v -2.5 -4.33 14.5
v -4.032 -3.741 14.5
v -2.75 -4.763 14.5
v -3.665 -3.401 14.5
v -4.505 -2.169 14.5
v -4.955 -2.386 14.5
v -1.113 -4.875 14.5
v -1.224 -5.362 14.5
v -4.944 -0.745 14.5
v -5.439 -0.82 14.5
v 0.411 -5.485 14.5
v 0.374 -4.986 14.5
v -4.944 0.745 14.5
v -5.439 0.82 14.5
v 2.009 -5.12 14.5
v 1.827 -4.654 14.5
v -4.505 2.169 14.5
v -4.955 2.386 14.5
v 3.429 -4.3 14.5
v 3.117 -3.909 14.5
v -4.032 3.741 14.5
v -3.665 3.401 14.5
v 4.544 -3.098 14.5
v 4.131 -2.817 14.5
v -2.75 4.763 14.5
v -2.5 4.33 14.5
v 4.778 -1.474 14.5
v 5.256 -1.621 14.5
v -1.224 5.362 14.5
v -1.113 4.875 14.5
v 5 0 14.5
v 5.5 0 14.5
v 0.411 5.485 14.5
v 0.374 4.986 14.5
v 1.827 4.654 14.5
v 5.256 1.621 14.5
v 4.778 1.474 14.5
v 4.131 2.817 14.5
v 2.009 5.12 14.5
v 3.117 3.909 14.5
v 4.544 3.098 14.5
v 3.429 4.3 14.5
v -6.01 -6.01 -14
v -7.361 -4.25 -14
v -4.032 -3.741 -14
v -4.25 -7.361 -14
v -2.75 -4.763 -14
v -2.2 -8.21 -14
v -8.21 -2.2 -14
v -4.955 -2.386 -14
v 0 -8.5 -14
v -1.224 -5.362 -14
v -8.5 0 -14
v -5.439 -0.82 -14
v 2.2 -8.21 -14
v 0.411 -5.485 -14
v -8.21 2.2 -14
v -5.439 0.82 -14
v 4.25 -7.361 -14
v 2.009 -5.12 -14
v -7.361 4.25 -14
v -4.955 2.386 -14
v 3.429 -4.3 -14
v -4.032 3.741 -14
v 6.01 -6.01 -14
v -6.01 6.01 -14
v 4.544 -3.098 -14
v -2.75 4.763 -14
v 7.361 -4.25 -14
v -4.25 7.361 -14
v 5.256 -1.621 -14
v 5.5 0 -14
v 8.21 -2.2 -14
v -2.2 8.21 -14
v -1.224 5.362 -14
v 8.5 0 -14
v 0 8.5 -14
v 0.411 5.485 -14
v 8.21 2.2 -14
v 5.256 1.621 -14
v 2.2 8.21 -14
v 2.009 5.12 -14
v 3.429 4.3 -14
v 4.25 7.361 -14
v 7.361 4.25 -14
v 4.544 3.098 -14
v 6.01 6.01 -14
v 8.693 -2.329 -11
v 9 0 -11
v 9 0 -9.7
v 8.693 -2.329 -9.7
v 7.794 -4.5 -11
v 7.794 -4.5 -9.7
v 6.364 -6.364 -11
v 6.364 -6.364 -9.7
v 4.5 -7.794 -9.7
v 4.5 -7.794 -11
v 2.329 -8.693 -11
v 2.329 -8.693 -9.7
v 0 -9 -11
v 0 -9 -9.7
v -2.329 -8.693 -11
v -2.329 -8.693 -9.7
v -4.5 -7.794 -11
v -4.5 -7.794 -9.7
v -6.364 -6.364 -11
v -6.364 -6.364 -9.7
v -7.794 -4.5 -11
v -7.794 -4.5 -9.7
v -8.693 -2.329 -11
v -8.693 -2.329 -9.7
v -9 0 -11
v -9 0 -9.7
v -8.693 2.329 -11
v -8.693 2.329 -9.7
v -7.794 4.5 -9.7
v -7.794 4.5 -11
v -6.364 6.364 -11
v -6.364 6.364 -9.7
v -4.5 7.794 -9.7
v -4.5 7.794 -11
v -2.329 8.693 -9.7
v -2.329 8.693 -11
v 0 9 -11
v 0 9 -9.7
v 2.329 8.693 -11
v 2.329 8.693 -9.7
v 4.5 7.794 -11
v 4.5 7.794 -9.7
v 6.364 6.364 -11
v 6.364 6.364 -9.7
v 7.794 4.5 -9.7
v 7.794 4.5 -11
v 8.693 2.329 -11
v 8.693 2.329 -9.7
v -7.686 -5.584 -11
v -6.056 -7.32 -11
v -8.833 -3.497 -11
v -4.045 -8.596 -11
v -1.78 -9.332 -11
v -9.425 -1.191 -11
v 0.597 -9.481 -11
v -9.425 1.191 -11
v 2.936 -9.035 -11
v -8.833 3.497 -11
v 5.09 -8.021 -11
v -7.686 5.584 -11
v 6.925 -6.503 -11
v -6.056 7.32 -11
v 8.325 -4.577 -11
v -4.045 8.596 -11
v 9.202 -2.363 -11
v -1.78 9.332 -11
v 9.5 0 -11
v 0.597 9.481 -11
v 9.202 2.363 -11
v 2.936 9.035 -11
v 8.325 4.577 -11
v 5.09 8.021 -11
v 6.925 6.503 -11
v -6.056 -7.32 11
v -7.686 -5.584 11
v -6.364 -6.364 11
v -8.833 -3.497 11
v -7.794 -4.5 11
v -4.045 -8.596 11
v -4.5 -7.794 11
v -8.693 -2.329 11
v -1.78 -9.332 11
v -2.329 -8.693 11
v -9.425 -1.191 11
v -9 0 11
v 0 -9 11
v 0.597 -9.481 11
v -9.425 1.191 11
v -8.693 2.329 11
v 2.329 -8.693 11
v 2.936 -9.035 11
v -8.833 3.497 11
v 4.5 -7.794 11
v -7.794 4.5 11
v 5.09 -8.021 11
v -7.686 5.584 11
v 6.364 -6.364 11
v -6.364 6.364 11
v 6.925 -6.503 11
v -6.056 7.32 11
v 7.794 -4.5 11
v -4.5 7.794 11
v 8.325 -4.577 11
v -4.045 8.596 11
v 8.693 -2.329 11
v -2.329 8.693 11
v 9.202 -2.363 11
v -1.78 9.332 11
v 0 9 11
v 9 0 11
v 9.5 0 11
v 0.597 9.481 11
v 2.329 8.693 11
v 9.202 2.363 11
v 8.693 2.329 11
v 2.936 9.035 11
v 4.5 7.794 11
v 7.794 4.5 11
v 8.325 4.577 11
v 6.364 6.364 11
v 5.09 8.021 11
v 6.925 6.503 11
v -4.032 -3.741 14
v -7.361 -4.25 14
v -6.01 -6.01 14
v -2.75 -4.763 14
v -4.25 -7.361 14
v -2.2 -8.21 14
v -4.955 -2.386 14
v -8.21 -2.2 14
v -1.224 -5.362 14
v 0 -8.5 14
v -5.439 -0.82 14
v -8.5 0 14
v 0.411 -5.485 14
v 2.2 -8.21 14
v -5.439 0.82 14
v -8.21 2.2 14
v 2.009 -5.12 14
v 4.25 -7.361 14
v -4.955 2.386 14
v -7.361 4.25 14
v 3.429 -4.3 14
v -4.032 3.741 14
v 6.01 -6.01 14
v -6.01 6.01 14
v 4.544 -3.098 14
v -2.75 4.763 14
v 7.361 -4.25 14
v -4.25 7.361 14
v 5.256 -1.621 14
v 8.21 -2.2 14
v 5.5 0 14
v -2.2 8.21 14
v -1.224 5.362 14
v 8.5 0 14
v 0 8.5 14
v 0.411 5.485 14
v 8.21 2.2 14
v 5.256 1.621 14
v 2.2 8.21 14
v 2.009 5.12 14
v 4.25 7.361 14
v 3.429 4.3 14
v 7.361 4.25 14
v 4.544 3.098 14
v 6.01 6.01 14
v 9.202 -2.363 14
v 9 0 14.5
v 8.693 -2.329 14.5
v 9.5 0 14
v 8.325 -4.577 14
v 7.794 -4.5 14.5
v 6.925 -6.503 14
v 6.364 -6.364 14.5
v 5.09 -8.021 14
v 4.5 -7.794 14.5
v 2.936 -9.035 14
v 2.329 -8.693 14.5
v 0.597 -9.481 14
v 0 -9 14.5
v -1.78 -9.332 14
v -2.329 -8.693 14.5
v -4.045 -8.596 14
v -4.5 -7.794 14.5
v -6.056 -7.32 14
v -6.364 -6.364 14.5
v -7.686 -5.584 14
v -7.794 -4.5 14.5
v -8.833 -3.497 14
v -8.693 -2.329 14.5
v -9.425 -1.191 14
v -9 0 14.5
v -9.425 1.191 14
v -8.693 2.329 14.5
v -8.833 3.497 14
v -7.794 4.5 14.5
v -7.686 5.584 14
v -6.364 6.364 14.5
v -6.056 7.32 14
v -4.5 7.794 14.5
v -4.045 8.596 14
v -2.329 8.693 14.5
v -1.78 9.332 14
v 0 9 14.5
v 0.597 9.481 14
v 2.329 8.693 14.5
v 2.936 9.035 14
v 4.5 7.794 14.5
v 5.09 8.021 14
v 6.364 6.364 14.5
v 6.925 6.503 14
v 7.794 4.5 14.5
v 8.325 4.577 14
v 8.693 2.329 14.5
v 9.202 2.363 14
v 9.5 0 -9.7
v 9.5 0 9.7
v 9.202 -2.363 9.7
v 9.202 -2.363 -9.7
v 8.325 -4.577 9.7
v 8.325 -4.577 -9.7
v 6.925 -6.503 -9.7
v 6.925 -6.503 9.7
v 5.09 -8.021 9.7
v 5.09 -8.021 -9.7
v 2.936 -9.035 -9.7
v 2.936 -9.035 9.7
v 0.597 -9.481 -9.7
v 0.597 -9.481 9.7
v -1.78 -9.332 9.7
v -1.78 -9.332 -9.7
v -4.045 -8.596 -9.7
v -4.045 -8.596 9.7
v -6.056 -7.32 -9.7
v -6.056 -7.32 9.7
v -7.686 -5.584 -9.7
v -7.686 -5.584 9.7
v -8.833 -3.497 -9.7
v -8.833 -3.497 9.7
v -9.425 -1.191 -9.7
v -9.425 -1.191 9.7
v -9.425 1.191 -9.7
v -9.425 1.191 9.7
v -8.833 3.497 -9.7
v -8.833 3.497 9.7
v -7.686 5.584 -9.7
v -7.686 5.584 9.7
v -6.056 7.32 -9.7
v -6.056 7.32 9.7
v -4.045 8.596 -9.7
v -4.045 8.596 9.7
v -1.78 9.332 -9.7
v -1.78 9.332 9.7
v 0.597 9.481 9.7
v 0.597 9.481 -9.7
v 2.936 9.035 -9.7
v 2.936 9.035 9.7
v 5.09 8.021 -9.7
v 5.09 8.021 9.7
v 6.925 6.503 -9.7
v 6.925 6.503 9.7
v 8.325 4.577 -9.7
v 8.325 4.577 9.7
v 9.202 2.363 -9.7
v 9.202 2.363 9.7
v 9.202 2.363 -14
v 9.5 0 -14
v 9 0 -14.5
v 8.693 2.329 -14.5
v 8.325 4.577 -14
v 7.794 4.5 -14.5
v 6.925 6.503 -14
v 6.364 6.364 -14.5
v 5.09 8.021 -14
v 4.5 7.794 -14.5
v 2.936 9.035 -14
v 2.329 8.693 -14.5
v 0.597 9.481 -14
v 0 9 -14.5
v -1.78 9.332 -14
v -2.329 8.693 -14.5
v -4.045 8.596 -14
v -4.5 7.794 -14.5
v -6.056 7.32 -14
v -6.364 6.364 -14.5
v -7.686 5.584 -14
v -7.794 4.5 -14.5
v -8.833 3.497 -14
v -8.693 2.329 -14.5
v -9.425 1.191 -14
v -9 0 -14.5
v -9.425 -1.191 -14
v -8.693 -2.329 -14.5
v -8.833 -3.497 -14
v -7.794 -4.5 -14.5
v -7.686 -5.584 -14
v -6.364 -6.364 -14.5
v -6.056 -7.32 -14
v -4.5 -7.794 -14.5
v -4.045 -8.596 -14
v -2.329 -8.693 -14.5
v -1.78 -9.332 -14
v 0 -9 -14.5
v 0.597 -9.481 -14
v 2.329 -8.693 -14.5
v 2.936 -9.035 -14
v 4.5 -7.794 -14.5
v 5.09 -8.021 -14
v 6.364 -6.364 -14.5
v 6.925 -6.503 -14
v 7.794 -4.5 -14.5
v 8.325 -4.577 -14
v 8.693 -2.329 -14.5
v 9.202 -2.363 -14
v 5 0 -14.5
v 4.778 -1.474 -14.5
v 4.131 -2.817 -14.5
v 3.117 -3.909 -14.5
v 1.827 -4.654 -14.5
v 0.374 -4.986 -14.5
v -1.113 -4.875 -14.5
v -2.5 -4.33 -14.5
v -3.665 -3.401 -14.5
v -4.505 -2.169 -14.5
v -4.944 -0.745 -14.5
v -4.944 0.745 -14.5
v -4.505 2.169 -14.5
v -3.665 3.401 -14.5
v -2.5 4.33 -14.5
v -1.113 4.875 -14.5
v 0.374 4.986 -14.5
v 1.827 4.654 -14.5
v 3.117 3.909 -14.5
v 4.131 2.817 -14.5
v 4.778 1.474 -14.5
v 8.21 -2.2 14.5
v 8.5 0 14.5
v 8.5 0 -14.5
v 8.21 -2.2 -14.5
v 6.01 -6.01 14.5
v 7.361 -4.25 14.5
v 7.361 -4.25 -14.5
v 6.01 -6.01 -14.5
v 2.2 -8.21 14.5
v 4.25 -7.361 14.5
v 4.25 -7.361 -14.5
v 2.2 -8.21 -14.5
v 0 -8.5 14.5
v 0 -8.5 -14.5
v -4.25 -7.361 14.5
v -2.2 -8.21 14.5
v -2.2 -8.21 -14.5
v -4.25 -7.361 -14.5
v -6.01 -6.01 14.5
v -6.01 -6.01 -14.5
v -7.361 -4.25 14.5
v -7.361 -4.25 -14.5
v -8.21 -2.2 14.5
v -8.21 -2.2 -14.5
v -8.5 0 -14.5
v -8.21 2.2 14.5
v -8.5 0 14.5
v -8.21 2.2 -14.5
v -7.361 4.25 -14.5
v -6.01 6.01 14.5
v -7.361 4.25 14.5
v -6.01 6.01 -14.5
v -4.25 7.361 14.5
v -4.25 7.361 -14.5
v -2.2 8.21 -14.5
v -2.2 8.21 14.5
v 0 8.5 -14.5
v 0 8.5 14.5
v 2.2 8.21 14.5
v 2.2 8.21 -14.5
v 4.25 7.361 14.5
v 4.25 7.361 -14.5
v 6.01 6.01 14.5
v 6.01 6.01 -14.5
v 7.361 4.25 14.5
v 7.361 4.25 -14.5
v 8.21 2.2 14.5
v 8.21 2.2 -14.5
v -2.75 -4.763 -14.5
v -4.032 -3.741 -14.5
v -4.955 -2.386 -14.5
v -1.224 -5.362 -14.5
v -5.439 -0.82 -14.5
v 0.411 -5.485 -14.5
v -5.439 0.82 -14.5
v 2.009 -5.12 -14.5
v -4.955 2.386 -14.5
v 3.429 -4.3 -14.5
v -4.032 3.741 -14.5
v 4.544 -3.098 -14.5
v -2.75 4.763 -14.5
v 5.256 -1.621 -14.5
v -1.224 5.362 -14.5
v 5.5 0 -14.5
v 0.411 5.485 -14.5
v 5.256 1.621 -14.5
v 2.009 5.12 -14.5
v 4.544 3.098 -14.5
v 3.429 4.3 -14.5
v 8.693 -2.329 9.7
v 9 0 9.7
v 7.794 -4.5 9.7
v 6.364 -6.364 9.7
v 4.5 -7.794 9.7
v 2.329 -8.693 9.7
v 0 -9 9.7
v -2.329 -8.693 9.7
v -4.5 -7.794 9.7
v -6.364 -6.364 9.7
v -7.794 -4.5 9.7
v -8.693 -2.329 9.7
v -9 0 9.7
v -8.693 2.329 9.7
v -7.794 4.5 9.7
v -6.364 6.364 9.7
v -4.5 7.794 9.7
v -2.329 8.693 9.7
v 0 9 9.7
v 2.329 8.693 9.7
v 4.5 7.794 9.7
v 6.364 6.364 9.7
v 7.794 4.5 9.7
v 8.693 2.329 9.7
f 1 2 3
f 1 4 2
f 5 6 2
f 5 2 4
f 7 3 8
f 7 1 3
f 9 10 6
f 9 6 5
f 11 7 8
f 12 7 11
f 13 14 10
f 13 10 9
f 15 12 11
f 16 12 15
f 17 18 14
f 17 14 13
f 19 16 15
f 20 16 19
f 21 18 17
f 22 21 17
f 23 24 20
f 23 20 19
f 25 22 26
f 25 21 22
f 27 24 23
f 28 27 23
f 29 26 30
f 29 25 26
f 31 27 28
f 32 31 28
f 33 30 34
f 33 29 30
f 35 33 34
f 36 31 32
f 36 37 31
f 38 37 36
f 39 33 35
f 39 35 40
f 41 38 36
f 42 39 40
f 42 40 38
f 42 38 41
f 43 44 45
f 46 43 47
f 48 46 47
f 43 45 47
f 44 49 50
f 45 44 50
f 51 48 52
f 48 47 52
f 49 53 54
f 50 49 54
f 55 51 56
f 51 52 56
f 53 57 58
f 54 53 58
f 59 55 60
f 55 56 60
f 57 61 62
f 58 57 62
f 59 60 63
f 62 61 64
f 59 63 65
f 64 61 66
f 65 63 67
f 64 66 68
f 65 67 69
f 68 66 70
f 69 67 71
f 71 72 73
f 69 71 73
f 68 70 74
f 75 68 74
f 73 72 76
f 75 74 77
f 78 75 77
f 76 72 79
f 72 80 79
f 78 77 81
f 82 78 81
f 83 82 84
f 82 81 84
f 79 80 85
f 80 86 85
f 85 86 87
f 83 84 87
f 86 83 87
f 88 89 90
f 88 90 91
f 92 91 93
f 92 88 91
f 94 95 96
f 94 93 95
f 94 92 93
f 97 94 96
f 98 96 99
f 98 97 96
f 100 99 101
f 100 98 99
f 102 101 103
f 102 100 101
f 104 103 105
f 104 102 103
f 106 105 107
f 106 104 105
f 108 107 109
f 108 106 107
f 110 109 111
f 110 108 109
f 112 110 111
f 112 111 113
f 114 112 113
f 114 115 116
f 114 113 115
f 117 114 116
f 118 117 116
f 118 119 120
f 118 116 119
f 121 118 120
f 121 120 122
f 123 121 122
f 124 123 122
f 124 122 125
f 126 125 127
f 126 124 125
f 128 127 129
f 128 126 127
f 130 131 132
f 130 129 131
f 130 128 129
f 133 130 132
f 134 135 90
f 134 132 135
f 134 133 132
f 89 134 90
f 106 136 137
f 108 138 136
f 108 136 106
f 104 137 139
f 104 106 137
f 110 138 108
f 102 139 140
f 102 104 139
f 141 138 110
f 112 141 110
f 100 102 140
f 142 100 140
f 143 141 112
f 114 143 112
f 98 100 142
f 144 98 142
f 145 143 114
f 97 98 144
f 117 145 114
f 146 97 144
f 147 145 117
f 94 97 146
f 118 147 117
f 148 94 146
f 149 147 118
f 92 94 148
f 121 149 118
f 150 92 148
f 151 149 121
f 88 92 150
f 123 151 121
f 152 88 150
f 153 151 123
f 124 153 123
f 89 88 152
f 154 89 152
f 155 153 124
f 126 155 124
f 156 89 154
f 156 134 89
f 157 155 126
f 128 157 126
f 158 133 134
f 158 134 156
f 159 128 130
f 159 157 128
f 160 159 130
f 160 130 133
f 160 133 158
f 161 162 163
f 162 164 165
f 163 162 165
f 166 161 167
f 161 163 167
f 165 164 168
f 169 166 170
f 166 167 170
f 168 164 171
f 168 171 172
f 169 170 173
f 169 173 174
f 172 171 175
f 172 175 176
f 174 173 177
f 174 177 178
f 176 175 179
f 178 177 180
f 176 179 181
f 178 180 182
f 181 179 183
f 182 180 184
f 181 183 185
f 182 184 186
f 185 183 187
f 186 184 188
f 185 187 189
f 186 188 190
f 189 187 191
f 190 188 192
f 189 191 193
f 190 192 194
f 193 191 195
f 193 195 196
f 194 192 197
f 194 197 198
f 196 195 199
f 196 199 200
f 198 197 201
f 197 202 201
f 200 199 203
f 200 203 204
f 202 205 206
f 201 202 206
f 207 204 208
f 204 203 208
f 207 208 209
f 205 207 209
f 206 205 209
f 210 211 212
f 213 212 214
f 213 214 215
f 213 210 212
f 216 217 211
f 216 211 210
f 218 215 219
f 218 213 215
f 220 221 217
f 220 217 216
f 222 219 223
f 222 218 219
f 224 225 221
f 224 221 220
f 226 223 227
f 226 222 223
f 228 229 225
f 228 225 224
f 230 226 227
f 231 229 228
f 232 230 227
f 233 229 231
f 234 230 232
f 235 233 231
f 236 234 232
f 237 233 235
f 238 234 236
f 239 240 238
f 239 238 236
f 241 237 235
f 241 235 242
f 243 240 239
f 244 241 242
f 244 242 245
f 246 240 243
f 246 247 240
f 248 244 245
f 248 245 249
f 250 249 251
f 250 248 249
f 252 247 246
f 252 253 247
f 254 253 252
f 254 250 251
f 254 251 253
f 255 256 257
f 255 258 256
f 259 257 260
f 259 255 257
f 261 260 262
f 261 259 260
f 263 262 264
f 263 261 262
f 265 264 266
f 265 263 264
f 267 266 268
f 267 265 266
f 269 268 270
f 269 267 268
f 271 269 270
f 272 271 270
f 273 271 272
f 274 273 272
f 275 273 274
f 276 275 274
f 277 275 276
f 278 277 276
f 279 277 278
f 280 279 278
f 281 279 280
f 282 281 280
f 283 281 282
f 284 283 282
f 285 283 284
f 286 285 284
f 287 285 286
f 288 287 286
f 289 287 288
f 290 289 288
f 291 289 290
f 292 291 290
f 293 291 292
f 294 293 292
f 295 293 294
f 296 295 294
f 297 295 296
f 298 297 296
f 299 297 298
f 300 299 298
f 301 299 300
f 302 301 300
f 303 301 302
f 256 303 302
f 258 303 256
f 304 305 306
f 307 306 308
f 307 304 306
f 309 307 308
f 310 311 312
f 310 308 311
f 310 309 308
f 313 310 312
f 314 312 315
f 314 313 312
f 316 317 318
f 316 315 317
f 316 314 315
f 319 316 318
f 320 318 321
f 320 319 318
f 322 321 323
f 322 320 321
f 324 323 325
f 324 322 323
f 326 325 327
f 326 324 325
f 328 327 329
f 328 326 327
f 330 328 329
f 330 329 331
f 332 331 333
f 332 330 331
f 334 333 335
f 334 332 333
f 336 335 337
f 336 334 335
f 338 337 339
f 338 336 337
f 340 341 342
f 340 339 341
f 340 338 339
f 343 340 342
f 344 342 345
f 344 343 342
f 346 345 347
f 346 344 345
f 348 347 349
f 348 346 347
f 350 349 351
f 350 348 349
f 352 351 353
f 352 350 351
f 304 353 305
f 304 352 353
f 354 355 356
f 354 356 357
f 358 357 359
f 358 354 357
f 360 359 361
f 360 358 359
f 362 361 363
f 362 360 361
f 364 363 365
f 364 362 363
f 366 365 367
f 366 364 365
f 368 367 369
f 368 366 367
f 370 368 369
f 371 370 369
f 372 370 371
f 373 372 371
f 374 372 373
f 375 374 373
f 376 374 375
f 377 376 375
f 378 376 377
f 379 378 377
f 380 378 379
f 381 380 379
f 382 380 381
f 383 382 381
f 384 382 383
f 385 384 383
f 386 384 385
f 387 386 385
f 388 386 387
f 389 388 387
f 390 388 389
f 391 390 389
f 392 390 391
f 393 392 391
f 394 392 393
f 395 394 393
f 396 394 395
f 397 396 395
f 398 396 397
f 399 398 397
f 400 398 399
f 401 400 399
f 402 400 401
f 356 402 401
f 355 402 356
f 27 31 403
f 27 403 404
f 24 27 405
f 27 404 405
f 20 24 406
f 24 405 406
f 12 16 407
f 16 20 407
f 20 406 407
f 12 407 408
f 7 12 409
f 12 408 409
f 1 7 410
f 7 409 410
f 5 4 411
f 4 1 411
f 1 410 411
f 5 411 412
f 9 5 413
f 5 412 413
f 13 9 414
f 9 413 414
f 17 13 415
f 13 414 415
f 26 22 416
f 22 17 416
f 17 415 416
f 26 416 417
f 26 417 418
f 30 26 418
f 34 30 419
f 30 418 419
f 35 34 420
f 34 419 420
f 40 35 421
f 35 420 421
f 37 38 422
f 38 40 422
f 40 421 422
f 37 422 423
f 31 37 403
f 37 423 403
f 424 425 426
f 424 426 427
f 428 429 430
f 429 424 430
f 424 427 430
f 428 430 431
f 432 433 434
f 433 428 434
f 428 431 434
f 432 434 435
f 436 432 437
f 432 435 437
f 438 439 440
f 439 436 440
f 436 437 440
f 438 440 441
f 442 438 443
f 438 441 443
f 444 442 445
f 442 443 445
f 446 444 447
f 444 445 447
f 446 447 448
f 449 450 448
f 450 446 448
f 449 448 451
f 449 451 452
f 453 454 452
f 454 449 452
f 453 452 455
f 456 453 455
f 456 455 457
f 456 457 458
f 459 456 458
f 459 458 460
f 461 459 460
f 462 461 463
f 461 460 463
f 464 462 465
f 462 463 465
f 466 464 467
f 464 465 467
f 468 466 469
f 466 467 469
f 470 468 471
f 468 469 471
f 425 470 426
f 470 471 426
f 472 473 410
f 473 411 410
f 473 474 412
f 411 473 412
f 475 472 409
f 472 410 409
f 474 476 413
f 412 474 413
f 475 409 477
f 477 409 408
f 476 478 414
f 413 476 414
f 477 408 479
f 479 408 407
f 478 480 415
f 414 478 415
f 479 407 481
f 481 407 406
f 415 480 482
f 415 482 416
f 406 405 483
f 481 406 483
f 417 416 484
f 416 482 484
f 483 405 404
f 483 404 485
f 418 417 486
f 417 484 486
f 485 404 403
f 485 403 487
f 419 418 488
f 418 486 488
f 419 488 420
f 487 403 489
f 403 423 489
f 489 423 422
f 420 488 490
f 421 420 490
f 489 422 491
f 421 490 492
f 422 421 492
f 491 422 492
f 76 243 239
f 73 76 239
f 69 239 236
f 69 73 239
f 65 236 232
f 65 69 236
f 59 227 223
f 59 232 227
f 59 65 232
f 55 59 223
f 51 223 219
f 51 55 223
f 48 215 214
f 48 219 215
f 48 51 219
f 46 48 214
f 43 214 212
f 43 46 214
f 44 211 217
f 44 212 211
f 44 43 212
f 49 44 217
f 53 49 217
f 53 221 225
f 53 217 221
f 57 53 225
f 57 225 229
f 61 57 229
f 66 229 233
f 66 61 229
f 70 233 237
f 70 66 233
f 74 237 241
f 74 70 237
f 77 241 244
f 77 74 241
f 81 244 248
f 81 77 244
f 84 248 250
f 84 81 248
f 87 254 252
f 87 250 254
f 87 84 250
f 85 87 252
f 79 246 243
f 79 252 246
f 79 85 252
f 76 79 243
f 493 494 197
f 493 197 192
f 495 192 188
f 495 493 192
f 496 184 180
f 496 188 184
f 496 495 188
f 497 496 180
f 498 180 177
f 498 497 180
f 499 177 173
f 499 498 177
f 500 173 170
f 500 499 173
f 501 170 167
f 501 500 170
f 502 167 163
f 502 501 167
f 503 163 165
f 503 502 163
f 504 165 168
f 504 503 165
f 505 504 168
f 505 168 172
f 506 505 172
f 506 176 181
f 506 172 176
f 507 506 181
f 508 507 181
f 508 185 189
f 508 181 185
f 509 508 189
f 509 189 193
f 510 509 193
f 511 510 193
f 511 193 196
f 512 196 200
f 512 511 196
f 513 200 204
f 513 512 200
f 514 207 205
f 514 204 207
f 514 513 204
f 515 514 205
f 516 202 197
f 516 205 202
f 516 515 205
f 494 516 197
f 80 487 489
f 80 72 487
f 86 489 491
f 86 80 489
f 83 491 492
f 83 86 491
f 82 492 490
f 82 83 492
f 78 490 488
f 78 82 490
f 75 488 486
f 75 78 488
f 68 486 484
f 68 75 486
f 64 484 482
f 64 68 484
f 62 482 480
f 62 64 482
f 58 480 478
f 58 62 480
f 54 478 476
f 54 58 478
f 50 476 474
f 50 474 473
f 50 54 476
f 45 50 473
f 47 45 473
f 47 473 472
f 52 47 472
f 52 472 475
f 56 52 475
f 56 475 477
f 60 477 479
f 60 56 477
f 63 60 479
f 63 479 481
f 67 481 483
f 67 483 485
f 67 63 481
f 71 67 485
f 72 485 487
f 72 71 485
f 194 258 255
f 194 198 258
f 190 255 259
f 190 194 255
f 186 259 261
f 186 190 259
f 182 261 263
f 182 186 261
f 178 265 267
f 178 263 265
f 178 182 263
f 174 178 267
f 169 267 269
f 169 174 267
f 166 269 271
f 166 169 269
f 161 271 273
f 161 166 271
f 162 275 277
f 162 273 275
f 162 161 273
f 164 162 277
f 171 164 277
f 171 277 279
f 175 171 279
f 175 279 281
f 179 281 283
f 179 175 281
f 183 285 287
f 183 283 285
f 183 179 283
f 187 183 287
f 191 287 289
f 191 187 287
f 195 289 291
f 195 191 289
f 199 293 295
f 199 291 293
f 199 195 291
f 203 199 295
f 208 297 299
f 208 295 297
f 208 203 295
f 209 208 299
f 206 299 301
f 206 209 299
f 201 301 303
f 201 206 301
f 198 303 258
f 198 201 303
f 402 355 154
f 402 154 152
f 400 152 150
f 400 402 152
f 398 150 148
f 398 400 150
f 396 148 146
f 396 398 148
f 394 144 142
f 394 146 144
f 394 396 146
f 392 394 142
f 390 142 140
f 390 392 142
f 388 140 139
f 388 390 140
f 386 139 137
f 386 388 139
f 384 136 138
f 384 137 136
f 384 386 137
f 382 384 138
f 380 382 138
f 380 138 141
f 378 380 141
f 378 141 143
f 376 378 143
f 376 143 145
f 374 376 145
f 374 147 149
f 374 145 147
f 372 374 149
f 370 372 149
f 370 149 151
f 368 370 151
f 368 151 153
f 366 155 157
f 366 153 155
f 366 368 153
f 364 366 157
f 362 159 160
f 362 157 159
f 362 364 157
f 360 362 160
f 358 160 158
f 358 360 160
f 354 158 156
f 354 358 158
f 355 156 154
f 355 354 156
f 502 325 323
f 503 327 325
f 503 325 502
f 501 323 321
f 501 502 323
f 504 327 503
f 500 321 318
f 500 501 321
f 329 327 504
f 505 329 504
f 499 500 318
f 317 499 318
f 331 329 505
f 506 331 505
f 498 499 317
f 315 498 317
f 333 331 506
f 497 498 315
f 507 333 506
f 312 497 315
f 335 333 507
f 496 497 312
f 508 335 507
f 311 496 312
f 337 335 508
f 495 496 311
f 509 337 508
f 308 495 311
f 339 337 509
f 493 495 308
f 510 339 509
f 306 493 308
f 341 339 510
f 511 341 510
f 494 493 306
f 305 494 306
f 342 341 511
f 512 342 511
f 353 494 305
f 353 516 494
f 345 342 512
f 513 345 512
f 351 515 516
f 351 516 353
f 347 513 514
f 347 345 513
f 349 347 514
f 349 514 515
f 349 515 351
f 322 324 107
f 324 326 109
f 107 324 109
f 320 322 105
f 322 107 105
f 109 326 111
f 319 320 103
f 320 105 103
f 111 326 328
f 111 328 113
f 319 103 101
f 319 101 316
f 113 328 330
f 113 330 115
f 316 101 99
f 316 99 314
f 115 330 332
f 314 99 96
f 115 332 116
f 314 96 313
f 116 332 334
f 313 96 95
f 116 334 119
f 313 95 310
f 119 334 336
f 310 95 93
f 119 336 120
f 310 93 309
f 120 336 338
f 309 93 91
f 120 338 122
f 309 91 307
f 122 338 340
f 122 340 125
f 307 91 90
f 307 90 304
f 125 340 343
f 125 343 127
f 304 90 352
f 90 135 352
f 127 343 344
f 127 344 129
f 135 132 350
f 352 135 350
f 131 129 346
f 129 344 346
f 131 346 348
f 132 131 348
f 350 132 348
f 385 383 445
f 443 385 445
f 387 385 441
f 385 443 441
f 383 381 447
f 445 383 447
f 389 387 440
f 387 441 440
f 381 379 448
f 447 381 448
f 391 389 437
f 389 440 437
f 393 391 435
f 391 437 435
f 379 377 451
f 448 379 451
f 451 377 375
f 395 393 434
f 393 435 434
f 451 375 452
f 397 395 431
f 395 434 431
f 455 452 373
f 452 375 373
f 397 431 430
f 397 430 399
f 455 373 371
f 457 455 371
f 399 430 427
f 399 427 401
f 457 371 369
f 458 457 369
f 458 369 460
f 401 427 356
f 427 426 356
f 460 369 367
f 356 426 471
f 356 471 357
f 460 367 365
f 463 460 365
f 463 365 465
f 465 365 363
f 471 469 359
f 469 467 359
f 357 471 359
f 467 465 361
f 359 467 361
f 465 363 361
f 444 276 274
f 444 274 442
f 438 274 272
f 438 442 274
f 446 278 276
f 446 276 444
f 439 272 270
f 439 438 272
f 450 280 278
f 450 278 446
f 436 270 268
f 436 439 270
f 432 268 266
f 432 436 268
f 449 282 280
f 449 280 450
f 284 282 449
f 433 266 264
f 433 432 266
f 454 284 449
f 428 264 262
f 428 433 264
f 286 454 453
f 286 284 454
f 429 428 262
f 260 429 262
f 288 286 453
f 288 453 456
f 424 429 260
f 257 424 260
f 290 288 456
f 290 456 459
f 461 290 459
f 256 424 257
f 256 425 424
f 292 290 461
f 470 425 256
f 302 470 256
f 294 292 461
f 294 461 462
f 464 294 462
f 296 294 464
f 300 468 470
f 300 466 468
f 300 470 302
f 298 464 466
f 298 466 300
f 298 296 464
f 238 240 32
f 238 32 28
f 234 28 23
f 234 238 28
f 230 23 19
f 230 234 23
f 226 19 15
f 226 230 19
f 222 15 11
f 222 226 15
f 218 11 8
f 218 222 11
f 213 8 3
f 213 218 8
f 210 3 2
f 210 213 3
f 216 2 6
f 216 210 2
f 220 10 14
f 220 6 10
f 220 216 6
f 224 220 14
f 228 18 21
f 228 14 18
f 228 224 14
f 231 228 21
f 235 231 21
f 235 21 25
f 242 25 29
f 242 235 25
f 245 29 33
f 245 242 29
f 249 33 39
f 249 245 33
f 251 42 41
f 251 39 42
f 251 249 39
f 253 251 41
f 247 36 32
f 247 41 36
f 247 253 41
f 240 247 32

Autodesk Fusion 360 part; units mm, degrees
sketch "スケッチ1" plane through (0, 0, 0) normal (0, 1, 0) x (1, 0, 0)
  line L0 (0, 0) -> (0, -14.5)
  line L1 (0, -14.5) -> (9.5, -14.5)
  line L2 (9.5, -14.5) -> (9.5, -11)
  line L3 (9.5, -11) -> (9, -11)
  line L4 (9, -11) -> (9, -9.7)
  line L5 (9, -9.7) -> (9.5, -9.7)
  line L6 (9.5, -9.7) -> (9.5, 9.7)
  line L7 (9.5, 9.7) -> (9, 9.7)
  line L8 (9, 9.7) -> (9, 11)
  line L9 (9, 11) -> (9.5, 11)
  line L10 (9.5, 11) -> (9.5, 14.5)
  line L11 (9.5, 14.5) -> (0, 14.5)
  line L12 (0, 14.5) -> (0, 0)
  line L13 (8.5, -14.5) -> (8.5, 14.5)
  line L14 (5.5, -14.5) -> (5.5, -14)
  line L15 (5.5, -14) -> (8.5, -14)
  line L16 (5, -14.5) -> (5, 14.5)
  line L17 (5.5, 14.5) -> (5.5, 14)
  line L18 (5.5, 14) -> (8.5, 14)
  dimension "d1" = 9.5
  dimension "d2" = 14.5
  dimension "d3" = 14.5
  dimension "d4" = 9
  dimension "d5" = 3.5
  dimension "d6" = 1.3
  dimension "d7" = 3.5
  dimension "d8" = 1.3
  dimension "d9" = 8.5
  dimension "d10" = 5
  dimension "d11" = 0.5
  dimension "d12" = 0.5
  dimension "d13" = 0.5
revolve "回転1" add sketch "スケッチ1" angle 360 about axis through (0, 0, 0) along (0, 0, 1) contours L1 L11 L13 L14 L15 L16 L17 L18 makes body 1
revolve "回転2" add sketch "スケッチ1" angle 360 about axis through (0, 0, 1.75) along (0, 0, 1) separate body contours L1 L2 L3 L4 L5 L6 L7 L8 L9 L10 L11 L13 makes body 2
chamfer "面取り1" distance 0.5 angle 45 2 edges at (-8.8571, -3.4353, 14.5) (-8.8571, -3.4353, -14.5) on bodies 2
equation "d3 = d2"
equation "d7 = d5"
equation "d8 = d6"
equation "d13 = d12"
